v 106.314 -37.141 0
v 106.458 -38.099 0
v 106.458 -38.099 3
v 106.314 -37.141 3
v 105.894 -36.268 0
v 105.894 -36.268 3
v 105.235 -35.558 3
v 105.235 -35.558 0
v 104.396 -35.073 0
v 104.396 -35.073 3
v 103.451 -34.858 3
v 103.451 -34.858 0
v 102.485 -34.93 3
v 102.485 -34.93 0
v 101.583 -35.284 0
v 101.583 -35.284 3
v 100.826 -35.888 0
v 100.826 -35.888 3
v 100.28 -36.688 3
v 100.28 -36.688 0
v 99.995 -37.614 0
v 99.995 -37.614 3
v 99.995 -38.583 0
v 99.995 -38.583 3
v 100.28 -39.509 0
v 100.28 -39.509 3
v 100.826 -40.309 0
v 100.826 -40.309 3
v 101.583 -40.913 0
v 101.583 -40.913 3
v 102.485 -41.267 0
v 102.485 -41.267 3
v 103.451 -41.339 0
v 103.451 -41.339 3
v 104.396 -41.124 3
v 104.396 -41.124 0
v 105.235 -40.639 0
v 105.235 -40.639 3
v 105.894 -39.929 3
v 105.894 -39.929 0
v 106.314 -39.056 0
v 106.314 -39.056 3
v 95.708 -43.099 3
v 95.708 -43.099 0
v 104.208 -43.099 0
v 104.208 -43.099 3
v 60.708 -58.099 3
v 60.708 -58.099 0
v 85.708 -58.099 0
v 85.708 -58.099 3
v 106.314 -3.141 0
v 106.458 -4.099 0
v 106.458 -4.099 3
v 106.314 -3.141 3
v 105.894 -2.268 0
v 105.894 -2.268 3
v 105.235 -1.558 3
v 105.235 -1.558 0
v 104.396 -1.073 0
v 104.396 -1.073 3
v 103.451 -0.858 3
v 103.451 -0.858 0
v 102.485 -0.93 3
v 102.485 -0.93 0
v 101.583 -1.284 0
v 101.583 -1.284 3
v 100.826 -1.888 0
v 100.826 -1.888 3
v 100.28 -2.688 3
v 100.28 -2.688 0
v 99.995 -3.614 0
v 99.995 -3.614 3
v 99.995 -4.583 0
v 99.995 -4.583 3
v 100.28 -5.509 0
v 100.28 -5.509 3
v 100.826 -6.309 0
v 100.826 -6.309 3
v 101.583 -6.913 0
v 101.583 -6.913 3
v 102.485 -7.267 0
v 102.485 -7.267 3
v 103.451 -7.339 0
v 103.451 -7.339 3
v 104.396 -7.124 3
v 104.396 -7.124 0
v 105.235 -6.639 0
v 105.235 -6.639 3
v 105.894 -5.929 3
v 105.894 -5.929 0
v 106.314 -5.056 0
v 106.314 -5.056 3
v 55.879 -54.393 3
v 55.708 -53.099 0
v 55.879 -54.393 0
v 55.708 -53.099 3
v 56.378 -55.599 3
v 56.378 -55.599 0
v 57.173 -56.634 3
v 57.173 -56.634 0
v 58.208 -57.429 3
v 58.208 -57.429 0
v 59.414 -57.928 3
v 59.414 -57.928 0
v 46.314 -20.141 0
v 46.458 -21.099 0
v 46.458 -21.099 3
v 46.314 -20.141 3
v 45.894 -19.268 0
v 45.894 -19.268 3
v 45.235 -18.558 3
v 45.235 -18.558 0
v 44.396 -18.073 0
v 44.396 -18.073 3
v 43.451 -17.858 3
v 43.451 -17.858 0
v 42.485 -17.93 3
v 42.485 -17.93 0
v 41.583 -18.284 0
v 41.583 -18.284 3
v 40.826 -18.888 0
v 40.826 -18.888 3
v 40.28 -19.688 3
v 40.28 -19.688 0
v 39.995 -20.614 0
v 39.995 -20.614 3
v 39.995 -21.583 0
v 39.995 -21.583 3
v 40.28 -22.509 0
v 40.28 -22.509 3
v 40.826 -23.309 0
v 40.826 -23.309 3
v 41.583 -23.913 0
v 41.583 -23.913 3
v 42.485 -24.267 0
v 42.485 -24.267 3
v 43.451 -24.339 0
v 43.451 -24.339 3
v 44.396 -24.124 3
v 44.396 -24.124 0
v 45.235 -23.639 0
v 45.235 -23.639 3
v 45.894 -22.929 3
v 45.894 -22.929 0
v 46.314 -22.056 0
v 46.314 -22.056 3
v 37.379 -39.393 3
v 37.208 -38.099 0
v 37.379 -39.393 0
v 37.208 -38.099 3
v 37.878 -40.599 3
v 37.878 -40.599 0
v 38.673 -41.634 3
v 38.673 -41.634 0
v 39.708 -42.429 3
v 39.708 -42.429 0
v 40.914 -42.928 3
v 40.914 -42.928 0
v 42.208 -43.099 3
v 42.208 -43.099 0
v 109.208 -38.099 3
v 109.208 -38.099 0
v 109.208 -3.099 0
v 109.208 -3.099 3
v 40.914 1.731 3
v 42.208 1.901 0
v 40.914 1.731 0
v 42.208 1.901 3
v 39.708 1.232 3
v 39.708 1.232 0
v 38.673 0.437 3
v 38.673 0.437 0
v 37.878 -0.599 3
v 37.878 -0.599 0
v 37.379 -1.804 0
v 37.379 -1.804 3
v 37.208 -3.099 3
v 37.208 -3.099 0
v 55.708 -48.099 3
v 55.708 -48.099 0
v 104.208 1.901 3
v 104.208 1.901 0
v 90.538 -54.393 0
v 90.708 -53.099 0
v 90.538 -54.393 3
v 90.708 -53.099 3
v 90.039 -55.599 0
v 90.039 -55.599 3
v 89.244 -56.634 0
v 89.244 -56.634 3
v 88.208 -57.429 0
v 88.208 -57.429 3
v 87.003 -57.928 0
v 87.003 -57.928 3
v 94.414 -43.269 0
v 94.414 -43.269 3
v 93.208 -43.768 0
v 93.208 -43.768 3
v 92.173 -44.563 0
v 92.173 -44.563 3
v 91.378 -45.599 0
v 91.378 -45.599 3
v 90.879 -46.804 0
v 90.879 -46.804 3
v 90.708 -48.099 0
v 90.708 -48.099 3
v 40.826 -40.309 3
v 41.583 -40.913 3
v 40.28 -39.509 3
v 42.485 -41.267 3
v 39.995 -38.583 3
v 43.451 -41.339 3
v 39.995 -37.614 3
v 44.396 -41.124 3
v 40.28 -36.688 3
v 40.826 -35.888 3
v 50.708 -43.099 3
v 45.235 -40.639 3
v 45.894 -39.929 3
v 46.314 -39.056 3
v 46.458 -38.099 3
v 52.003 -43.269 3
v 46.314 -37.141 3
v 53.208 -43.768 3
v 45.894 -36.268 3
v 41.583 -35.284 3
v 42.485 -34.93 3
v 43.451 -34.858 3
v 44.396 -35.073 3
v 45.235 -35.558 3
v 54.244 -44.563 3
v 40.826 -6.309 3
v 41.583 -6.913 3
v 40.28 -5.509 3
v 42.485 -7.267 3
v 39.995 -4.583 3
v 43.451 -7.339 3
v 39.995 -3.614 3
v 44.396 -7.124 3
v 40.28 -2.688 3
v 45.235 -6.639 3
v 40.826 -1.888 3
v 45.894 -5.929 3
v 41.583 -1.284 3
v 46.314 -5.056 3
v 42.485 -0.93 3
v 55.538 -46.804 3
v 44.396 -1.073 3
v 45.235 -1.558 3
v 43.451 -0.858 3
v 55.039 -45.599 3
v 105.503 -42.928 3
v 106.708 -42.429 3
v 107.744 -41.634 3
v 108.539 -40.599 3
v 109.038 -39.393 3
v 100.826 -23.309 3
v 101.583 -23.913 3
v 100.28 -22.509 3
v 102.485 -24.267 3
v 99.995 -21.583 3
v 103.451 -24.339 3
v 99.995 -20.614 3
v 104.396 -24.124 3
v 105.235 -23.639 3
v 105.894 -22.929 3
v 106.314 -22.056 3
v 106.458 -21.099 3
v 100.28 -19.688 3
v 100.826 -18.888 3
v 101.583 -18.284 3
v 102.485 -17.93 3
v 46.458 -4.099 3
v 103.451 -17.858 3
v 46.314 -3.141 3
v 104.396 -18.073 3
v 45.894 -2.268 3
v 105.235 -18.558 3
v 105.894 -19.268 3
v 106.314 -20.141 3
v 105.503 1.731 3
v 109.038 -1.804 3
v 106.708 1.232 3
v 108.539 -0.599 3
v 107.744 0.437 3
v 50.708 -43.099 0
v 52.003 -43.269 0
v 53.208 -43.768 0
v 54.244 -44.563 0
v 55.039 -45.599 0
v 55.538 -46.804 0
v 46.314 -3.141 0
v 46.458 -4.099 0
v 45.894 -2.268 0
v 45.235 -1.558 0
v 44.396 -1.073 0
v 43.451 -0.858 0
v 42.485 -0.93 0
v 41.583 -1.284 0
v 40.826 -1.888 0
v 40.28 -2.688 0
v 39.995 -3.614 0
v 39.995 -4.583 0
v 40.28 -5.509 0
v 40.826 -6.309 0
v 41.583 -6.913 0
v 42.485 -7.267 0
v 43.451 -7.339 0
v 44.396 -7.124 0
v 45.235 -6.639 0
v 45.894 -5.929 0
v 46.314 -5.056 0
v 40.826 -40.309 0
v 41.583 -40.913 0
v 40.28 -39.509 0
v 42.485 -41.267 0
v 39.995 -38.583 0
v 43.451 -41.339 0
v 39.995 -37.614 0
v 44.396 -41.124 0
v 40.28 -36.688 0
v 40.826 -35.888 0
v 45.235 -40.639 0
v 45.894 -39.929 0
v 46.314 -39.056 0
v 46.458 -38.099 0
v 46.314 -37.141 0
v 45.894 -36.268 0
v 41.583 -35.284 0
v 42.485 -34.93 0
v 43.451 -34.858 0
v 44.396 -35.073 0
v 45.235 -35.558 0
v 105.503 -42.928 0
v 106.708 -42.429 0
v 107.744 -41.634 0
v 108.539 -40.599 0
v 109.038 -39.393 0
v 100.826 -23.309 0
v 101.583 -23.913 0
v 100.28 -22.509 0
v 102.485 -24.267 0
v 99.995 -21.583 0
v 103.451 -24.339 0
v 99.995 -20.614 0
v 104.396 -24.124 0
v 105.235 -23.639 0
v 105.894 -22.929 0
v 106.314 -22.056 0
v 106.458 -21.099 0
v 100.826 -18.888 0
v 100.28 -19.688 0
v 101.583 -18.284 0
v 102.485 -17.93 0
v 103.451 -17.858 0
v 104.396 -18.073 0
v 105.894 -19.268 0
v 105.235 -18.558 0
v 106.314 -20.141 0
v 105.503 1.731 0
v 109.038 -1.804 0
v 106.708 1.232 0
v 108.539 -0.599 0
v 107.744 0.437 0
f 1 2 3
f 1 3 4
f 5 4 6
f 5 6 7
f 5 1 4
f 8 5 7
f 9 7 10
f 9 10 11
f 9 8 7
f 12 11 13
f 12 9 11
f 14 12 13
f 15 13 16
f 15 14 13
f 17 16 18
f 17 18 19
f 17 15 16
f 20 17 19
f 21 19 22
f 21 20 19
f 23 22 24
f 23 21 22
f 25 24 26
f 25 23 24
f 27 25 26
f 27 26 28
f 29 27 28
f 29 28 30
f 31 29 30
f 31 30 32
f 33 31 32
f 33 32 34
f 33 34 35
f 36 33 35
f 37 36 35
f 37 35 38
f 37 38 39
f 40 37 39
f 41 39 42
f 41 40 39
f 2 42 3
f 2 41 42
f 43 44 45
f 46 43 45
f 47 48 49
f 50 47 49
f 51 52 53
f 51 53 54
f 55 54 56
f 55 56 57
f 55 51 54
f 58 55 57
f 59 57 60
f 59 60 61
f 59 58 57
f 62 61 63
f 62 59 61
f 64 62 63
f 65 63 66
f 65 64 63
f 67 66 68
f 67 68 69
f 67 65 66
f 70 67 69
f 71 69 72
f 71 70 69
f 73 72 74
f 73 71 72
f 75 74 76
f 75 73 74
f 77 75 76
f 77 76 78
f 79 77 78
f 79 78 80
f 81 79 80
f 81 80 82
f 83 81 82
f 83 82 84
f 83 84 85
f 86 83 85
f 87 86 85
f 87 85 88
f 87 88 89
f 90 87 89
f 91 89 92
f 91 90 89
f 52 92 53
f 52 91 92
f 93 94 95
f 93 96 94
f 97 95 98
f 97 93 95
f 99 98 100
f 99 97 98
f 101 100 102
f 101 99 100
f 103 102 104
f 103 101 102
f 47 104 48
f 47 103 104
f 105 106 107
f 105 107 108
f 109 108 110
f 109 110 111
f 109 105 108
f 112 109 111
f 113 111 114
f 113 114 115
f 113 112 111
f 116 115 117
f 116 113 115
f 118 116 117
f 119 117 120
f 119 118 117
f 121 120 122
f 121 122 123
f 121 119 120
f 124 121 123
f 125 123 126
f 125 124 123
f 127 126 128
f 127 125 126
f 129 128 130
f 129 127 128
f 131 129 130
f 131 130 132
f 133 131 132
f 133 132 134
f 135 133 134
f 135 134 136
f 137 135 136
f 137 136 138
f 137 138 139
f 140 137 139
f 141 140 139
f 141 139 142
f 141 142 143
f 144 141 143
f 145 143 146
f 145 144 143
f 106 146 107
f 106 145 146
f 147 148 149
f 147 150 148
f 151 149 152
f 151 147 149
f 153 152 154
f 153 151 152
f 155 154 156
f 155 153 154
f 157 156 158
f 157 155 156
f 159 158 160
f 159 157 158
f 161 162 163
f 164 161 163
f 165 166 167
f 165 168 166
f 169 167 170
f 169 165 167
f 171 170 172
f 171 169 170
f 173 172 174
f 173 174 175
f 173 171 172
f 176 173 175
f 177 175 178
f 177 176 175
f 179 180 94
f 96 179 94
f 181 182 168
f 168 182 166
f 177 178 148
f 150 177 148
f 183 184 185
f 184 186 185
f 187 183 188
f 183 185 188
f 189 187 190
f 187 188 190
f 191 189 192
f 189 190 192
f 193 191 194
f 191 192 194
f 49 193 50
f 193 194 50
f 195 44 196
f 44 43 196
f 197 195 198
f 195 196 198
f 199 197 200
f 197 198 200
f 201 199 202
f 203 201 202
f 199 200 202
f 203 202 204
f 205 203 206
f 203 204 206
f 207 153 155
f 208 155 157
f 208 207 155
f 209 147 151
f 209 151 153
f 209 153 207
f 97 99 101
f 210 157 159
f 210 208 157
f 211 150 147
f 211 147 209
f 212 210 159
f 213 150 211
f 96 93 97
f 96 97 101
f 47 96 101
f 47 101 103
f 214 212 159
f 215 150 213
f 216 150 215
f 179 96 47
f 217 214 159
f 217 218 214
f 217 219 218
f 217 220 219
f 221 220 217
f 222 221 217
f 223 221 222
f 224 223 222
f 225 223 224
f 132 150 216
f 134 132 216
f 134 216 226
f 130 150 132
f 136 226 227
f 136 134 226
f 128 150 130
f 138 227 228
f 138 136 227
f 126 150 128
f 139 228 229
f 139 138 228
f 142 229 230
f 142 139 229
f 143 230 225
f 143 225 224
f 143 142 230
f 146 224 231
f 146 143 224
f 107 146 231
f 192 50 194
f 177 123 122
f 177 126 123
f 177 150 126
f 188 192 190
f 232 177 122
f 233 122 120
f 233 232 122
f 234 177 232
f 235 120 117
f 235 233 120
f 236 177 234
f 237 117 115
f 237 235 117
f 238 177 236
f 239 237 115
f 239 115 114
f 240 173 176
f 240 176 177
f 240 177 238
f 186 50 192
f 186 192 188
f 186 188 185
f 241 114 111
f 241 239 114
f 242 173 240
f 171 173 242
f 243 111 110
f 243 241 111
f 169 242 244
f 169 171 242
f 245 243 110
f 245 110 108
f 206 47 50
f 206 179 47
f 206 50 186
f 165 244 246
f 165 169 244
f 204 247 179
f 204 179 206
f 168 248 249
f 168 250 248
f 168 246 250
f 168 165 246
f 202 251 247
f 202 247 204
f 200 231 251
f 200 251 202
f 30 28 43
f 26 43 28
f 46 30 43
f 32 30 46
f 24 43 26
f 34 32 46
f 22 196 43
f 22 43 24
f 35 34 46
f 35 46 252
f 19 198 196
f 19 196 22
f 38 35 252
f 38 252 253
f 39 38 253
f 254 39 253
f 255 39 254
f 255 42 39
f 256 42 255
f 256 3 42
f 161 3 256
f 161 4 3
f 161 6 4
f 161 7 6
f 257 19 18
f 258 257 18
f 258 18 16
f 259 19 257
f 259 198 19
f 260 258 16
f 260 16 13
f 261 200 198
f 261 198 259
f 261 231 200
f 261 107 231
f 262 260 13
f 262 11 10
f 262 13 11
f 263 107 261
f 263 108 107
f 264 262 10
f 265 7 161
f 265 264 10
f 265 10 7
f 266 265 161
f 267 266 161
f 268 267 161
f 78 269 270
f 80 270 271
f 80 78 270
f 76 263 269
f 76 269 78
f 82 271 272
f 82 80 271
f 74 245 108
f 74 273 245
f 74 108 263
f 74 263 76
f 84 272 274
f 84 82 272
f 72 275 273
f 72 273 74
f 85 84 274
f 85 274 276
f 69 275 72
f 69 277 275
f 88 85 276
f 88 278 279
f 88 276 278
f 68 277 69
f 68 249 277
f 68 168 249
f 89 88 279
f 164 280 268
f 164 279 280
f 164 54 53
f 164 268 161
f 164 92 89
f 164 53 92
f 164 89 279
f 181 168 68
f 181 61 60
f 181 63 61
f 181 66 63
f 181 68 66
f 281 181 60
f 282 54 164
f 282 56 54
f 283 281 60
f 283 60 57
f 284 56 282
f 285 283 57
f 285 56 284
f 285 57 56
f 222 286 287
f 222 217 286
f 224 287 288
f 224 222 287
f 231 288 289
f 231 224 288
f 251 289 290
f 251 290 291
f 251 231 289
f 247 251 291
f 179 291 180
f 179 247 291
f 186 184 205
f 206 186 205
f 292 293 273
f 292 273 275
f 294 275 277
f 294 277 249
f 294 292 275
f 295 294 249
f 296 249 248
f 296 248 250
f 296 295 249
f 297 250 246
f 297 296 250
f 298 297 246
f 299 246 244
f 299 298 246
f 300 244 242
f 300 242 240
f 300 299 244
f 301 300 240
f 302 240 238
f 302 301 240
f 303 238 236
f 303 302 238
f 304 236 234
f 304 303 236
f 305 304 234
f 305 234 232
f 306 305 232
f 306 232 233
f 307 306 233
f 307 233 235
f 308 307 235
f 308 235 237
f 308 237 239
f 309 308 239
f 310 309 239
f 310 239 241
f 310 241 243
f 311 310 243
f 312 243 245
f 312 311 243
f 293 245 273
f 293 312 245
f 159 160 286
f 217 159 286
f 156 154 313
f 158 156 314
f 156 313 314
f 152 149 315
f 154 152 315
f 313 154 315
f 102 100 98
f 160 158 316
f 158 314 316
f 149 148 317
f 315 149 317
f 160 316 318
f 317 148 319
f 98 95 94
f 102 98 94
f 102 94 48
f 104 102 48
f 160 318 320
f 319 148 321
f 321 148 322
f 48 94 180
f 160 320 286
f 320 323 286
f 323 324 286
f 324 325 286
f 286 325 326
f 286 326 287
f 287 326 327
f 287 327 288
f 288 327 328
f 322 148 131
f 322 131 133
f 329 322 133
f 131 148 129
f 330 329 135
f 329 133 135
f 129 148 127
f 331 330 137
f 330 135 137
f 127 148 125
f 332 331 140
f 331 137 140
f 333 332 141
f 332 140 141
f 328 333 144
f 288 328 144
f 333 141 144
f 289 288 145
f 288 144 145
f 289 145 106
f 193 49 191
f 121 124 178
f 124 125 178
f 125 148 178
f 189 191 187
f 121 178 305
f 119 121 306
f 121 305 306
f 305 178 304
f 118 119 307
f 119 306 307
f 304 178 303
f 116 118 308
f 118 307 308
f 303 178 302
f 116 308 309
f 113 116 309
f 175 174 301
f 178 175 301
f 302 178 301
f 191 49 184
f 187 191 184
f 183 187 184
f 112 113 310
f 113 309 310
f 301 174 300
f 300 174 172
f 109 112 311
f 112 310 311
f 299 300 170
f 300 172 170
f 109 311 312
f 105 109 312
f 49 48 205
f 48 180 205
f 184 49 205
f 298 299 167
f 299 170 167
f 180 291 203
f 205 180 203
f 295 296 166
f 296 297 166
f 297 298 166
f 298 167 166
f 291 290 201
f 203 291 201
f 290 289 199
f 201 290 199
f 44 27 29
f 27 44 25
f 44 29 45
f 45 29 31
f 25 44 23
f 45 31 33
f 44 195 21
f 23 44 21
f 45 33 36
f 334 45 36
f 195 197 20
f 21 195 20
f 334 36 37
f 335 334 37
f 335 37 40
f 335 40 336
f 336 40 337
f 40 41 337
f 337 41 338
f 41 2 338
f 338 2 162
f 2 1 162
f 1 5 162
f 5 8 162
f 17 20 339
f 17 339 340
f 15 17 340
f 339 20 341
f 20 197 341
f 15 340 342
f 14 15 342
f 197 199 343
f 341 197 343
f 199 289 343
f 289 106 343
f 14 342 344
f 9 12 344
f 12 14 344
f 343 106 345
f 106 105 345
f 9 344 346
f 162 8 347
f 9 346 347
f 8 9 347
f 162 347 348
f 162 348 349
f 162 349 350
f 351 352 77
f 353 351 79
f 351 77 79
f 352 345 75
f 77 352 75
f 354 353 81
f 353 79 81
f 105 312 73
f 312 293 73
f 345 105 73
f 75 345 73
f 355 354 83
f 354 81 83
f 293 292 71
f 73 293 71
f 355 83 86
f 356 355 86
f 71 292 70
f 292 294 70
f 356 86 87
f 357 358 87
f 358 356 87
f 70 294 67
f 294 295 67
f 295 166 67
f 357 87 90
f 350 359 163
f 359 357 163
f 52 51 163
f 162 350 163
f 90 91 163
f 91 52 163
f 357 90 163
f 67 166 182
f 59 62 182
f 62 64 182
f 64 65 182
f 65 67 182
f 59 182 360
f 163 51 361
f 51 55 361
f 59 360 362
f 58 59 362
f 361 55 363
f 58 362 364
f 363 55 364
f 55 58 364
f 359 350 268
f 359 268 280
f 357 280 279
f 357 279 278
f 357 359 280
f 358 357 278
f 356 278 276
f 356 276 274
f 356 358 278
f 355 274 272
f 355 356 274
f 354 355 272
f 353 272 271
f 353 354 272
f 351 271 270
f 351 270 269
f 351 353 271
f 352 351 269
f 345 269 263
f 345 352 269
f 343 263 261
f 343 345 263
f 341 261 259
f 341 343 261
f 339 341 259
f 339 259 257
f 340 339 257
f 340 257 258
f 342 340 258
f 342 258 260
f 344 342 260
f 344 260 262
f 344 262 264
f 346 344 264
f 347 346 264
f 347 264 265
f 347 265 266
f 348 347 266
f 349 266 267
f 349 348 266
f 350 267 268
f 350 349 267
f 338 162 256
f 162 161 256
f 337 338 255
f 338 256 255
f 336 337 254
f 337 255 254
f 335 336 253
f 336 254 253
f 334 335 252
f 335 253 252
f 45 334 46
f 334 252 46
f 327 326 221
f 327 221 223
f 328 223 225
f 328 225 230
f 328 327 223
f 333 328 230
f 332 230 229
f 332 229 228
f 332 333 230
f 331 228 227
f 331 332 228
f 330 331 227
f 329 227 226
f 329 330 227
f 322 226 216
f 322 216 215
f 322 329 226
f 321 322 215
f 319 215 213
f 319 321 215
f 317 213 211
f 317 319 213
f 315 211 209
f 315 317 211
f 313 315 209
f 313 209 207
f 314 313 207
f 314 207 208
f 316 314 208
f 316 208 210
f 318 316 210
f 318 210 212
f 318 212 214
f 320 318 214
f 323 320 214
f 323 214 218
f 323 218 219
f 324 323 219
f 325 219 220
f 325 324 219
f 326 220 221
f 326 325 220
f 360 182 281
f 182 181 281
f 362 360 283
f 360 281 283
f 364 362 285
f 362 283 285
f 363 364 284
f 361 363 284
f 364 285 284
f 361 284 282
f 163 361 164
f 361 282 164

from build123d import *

# Parameters (mm, degrees)
ESQUISSE2_R        = 3.25
BOSS_EXTRU_1_DEPTH = 3
CONG_1_R           = 5


with BuildPart() as part:
    # Esquisse2 → Boss.-Extru.1 (new body)
    with BuildSketch(Plane.XY):
        Polygon((109.208492459, 1.901473412), (37.208492459, 1.901473412), (37.208492459, -43.098526588), (55.708492459, -43.098526588), (55.708492459, -58.098526588), (90.708492459, -58.098526588), (90.708492459, -43.098526588), (109.208492459, -43.098526588), align=None)
        with Locations((103.208492459, -4.098526588)):
            Circle(ESQUISSE2_R, mode=Mode.SUBTRACT)
        with Locations((103.208492459, -38.098526588)):
            Circle(ESQUISSE2_R, mode=Mode.SUBTRACT)
        with Locations((43.208492459, -38.098526588)):
            Circle(ESQUISSE2_R, mode=Mode.SUBTRACT)
        with Locations((43.208492459, -4.098526588)):
            Circle(ESQUISSE2_R, mode=Mode.SUBTRACT)
        with Locations((43.208492459, -21.098526588)):
            Circle(ESQUISSE2_R, mode=Mode.SUBTRACT)
        with Locations((103.208492459, -21.098526588)):
            Circle(ESQUISSE2_R, mode=Mode.SUBTRACT)
    extrude(amount=BOSS_EXTRU_1_DEPTH)

    # Congé1
    cong_1_edges = [part.edges().sort_by_distance(p)[0] for p in [
        (109.208492459, -43.098526588, 1.5),
        (90.708492459, -43.098526588, 1.5),
        (90.708492459, -58.098526588, 1.5),
        (55.708492459, -58.098526588, 1.5),
        (55.708492459, -43.098526588, 1.5),
        (37.208492459, -43.098526588, 1.5),
        (37.208492459, 1.901473412, 1.5),
        (109.208492459, 1.901473412, 1.5),
    ]]
    fillet(cong_1_edges, radius=CONG_1_R)


solid = part.part
